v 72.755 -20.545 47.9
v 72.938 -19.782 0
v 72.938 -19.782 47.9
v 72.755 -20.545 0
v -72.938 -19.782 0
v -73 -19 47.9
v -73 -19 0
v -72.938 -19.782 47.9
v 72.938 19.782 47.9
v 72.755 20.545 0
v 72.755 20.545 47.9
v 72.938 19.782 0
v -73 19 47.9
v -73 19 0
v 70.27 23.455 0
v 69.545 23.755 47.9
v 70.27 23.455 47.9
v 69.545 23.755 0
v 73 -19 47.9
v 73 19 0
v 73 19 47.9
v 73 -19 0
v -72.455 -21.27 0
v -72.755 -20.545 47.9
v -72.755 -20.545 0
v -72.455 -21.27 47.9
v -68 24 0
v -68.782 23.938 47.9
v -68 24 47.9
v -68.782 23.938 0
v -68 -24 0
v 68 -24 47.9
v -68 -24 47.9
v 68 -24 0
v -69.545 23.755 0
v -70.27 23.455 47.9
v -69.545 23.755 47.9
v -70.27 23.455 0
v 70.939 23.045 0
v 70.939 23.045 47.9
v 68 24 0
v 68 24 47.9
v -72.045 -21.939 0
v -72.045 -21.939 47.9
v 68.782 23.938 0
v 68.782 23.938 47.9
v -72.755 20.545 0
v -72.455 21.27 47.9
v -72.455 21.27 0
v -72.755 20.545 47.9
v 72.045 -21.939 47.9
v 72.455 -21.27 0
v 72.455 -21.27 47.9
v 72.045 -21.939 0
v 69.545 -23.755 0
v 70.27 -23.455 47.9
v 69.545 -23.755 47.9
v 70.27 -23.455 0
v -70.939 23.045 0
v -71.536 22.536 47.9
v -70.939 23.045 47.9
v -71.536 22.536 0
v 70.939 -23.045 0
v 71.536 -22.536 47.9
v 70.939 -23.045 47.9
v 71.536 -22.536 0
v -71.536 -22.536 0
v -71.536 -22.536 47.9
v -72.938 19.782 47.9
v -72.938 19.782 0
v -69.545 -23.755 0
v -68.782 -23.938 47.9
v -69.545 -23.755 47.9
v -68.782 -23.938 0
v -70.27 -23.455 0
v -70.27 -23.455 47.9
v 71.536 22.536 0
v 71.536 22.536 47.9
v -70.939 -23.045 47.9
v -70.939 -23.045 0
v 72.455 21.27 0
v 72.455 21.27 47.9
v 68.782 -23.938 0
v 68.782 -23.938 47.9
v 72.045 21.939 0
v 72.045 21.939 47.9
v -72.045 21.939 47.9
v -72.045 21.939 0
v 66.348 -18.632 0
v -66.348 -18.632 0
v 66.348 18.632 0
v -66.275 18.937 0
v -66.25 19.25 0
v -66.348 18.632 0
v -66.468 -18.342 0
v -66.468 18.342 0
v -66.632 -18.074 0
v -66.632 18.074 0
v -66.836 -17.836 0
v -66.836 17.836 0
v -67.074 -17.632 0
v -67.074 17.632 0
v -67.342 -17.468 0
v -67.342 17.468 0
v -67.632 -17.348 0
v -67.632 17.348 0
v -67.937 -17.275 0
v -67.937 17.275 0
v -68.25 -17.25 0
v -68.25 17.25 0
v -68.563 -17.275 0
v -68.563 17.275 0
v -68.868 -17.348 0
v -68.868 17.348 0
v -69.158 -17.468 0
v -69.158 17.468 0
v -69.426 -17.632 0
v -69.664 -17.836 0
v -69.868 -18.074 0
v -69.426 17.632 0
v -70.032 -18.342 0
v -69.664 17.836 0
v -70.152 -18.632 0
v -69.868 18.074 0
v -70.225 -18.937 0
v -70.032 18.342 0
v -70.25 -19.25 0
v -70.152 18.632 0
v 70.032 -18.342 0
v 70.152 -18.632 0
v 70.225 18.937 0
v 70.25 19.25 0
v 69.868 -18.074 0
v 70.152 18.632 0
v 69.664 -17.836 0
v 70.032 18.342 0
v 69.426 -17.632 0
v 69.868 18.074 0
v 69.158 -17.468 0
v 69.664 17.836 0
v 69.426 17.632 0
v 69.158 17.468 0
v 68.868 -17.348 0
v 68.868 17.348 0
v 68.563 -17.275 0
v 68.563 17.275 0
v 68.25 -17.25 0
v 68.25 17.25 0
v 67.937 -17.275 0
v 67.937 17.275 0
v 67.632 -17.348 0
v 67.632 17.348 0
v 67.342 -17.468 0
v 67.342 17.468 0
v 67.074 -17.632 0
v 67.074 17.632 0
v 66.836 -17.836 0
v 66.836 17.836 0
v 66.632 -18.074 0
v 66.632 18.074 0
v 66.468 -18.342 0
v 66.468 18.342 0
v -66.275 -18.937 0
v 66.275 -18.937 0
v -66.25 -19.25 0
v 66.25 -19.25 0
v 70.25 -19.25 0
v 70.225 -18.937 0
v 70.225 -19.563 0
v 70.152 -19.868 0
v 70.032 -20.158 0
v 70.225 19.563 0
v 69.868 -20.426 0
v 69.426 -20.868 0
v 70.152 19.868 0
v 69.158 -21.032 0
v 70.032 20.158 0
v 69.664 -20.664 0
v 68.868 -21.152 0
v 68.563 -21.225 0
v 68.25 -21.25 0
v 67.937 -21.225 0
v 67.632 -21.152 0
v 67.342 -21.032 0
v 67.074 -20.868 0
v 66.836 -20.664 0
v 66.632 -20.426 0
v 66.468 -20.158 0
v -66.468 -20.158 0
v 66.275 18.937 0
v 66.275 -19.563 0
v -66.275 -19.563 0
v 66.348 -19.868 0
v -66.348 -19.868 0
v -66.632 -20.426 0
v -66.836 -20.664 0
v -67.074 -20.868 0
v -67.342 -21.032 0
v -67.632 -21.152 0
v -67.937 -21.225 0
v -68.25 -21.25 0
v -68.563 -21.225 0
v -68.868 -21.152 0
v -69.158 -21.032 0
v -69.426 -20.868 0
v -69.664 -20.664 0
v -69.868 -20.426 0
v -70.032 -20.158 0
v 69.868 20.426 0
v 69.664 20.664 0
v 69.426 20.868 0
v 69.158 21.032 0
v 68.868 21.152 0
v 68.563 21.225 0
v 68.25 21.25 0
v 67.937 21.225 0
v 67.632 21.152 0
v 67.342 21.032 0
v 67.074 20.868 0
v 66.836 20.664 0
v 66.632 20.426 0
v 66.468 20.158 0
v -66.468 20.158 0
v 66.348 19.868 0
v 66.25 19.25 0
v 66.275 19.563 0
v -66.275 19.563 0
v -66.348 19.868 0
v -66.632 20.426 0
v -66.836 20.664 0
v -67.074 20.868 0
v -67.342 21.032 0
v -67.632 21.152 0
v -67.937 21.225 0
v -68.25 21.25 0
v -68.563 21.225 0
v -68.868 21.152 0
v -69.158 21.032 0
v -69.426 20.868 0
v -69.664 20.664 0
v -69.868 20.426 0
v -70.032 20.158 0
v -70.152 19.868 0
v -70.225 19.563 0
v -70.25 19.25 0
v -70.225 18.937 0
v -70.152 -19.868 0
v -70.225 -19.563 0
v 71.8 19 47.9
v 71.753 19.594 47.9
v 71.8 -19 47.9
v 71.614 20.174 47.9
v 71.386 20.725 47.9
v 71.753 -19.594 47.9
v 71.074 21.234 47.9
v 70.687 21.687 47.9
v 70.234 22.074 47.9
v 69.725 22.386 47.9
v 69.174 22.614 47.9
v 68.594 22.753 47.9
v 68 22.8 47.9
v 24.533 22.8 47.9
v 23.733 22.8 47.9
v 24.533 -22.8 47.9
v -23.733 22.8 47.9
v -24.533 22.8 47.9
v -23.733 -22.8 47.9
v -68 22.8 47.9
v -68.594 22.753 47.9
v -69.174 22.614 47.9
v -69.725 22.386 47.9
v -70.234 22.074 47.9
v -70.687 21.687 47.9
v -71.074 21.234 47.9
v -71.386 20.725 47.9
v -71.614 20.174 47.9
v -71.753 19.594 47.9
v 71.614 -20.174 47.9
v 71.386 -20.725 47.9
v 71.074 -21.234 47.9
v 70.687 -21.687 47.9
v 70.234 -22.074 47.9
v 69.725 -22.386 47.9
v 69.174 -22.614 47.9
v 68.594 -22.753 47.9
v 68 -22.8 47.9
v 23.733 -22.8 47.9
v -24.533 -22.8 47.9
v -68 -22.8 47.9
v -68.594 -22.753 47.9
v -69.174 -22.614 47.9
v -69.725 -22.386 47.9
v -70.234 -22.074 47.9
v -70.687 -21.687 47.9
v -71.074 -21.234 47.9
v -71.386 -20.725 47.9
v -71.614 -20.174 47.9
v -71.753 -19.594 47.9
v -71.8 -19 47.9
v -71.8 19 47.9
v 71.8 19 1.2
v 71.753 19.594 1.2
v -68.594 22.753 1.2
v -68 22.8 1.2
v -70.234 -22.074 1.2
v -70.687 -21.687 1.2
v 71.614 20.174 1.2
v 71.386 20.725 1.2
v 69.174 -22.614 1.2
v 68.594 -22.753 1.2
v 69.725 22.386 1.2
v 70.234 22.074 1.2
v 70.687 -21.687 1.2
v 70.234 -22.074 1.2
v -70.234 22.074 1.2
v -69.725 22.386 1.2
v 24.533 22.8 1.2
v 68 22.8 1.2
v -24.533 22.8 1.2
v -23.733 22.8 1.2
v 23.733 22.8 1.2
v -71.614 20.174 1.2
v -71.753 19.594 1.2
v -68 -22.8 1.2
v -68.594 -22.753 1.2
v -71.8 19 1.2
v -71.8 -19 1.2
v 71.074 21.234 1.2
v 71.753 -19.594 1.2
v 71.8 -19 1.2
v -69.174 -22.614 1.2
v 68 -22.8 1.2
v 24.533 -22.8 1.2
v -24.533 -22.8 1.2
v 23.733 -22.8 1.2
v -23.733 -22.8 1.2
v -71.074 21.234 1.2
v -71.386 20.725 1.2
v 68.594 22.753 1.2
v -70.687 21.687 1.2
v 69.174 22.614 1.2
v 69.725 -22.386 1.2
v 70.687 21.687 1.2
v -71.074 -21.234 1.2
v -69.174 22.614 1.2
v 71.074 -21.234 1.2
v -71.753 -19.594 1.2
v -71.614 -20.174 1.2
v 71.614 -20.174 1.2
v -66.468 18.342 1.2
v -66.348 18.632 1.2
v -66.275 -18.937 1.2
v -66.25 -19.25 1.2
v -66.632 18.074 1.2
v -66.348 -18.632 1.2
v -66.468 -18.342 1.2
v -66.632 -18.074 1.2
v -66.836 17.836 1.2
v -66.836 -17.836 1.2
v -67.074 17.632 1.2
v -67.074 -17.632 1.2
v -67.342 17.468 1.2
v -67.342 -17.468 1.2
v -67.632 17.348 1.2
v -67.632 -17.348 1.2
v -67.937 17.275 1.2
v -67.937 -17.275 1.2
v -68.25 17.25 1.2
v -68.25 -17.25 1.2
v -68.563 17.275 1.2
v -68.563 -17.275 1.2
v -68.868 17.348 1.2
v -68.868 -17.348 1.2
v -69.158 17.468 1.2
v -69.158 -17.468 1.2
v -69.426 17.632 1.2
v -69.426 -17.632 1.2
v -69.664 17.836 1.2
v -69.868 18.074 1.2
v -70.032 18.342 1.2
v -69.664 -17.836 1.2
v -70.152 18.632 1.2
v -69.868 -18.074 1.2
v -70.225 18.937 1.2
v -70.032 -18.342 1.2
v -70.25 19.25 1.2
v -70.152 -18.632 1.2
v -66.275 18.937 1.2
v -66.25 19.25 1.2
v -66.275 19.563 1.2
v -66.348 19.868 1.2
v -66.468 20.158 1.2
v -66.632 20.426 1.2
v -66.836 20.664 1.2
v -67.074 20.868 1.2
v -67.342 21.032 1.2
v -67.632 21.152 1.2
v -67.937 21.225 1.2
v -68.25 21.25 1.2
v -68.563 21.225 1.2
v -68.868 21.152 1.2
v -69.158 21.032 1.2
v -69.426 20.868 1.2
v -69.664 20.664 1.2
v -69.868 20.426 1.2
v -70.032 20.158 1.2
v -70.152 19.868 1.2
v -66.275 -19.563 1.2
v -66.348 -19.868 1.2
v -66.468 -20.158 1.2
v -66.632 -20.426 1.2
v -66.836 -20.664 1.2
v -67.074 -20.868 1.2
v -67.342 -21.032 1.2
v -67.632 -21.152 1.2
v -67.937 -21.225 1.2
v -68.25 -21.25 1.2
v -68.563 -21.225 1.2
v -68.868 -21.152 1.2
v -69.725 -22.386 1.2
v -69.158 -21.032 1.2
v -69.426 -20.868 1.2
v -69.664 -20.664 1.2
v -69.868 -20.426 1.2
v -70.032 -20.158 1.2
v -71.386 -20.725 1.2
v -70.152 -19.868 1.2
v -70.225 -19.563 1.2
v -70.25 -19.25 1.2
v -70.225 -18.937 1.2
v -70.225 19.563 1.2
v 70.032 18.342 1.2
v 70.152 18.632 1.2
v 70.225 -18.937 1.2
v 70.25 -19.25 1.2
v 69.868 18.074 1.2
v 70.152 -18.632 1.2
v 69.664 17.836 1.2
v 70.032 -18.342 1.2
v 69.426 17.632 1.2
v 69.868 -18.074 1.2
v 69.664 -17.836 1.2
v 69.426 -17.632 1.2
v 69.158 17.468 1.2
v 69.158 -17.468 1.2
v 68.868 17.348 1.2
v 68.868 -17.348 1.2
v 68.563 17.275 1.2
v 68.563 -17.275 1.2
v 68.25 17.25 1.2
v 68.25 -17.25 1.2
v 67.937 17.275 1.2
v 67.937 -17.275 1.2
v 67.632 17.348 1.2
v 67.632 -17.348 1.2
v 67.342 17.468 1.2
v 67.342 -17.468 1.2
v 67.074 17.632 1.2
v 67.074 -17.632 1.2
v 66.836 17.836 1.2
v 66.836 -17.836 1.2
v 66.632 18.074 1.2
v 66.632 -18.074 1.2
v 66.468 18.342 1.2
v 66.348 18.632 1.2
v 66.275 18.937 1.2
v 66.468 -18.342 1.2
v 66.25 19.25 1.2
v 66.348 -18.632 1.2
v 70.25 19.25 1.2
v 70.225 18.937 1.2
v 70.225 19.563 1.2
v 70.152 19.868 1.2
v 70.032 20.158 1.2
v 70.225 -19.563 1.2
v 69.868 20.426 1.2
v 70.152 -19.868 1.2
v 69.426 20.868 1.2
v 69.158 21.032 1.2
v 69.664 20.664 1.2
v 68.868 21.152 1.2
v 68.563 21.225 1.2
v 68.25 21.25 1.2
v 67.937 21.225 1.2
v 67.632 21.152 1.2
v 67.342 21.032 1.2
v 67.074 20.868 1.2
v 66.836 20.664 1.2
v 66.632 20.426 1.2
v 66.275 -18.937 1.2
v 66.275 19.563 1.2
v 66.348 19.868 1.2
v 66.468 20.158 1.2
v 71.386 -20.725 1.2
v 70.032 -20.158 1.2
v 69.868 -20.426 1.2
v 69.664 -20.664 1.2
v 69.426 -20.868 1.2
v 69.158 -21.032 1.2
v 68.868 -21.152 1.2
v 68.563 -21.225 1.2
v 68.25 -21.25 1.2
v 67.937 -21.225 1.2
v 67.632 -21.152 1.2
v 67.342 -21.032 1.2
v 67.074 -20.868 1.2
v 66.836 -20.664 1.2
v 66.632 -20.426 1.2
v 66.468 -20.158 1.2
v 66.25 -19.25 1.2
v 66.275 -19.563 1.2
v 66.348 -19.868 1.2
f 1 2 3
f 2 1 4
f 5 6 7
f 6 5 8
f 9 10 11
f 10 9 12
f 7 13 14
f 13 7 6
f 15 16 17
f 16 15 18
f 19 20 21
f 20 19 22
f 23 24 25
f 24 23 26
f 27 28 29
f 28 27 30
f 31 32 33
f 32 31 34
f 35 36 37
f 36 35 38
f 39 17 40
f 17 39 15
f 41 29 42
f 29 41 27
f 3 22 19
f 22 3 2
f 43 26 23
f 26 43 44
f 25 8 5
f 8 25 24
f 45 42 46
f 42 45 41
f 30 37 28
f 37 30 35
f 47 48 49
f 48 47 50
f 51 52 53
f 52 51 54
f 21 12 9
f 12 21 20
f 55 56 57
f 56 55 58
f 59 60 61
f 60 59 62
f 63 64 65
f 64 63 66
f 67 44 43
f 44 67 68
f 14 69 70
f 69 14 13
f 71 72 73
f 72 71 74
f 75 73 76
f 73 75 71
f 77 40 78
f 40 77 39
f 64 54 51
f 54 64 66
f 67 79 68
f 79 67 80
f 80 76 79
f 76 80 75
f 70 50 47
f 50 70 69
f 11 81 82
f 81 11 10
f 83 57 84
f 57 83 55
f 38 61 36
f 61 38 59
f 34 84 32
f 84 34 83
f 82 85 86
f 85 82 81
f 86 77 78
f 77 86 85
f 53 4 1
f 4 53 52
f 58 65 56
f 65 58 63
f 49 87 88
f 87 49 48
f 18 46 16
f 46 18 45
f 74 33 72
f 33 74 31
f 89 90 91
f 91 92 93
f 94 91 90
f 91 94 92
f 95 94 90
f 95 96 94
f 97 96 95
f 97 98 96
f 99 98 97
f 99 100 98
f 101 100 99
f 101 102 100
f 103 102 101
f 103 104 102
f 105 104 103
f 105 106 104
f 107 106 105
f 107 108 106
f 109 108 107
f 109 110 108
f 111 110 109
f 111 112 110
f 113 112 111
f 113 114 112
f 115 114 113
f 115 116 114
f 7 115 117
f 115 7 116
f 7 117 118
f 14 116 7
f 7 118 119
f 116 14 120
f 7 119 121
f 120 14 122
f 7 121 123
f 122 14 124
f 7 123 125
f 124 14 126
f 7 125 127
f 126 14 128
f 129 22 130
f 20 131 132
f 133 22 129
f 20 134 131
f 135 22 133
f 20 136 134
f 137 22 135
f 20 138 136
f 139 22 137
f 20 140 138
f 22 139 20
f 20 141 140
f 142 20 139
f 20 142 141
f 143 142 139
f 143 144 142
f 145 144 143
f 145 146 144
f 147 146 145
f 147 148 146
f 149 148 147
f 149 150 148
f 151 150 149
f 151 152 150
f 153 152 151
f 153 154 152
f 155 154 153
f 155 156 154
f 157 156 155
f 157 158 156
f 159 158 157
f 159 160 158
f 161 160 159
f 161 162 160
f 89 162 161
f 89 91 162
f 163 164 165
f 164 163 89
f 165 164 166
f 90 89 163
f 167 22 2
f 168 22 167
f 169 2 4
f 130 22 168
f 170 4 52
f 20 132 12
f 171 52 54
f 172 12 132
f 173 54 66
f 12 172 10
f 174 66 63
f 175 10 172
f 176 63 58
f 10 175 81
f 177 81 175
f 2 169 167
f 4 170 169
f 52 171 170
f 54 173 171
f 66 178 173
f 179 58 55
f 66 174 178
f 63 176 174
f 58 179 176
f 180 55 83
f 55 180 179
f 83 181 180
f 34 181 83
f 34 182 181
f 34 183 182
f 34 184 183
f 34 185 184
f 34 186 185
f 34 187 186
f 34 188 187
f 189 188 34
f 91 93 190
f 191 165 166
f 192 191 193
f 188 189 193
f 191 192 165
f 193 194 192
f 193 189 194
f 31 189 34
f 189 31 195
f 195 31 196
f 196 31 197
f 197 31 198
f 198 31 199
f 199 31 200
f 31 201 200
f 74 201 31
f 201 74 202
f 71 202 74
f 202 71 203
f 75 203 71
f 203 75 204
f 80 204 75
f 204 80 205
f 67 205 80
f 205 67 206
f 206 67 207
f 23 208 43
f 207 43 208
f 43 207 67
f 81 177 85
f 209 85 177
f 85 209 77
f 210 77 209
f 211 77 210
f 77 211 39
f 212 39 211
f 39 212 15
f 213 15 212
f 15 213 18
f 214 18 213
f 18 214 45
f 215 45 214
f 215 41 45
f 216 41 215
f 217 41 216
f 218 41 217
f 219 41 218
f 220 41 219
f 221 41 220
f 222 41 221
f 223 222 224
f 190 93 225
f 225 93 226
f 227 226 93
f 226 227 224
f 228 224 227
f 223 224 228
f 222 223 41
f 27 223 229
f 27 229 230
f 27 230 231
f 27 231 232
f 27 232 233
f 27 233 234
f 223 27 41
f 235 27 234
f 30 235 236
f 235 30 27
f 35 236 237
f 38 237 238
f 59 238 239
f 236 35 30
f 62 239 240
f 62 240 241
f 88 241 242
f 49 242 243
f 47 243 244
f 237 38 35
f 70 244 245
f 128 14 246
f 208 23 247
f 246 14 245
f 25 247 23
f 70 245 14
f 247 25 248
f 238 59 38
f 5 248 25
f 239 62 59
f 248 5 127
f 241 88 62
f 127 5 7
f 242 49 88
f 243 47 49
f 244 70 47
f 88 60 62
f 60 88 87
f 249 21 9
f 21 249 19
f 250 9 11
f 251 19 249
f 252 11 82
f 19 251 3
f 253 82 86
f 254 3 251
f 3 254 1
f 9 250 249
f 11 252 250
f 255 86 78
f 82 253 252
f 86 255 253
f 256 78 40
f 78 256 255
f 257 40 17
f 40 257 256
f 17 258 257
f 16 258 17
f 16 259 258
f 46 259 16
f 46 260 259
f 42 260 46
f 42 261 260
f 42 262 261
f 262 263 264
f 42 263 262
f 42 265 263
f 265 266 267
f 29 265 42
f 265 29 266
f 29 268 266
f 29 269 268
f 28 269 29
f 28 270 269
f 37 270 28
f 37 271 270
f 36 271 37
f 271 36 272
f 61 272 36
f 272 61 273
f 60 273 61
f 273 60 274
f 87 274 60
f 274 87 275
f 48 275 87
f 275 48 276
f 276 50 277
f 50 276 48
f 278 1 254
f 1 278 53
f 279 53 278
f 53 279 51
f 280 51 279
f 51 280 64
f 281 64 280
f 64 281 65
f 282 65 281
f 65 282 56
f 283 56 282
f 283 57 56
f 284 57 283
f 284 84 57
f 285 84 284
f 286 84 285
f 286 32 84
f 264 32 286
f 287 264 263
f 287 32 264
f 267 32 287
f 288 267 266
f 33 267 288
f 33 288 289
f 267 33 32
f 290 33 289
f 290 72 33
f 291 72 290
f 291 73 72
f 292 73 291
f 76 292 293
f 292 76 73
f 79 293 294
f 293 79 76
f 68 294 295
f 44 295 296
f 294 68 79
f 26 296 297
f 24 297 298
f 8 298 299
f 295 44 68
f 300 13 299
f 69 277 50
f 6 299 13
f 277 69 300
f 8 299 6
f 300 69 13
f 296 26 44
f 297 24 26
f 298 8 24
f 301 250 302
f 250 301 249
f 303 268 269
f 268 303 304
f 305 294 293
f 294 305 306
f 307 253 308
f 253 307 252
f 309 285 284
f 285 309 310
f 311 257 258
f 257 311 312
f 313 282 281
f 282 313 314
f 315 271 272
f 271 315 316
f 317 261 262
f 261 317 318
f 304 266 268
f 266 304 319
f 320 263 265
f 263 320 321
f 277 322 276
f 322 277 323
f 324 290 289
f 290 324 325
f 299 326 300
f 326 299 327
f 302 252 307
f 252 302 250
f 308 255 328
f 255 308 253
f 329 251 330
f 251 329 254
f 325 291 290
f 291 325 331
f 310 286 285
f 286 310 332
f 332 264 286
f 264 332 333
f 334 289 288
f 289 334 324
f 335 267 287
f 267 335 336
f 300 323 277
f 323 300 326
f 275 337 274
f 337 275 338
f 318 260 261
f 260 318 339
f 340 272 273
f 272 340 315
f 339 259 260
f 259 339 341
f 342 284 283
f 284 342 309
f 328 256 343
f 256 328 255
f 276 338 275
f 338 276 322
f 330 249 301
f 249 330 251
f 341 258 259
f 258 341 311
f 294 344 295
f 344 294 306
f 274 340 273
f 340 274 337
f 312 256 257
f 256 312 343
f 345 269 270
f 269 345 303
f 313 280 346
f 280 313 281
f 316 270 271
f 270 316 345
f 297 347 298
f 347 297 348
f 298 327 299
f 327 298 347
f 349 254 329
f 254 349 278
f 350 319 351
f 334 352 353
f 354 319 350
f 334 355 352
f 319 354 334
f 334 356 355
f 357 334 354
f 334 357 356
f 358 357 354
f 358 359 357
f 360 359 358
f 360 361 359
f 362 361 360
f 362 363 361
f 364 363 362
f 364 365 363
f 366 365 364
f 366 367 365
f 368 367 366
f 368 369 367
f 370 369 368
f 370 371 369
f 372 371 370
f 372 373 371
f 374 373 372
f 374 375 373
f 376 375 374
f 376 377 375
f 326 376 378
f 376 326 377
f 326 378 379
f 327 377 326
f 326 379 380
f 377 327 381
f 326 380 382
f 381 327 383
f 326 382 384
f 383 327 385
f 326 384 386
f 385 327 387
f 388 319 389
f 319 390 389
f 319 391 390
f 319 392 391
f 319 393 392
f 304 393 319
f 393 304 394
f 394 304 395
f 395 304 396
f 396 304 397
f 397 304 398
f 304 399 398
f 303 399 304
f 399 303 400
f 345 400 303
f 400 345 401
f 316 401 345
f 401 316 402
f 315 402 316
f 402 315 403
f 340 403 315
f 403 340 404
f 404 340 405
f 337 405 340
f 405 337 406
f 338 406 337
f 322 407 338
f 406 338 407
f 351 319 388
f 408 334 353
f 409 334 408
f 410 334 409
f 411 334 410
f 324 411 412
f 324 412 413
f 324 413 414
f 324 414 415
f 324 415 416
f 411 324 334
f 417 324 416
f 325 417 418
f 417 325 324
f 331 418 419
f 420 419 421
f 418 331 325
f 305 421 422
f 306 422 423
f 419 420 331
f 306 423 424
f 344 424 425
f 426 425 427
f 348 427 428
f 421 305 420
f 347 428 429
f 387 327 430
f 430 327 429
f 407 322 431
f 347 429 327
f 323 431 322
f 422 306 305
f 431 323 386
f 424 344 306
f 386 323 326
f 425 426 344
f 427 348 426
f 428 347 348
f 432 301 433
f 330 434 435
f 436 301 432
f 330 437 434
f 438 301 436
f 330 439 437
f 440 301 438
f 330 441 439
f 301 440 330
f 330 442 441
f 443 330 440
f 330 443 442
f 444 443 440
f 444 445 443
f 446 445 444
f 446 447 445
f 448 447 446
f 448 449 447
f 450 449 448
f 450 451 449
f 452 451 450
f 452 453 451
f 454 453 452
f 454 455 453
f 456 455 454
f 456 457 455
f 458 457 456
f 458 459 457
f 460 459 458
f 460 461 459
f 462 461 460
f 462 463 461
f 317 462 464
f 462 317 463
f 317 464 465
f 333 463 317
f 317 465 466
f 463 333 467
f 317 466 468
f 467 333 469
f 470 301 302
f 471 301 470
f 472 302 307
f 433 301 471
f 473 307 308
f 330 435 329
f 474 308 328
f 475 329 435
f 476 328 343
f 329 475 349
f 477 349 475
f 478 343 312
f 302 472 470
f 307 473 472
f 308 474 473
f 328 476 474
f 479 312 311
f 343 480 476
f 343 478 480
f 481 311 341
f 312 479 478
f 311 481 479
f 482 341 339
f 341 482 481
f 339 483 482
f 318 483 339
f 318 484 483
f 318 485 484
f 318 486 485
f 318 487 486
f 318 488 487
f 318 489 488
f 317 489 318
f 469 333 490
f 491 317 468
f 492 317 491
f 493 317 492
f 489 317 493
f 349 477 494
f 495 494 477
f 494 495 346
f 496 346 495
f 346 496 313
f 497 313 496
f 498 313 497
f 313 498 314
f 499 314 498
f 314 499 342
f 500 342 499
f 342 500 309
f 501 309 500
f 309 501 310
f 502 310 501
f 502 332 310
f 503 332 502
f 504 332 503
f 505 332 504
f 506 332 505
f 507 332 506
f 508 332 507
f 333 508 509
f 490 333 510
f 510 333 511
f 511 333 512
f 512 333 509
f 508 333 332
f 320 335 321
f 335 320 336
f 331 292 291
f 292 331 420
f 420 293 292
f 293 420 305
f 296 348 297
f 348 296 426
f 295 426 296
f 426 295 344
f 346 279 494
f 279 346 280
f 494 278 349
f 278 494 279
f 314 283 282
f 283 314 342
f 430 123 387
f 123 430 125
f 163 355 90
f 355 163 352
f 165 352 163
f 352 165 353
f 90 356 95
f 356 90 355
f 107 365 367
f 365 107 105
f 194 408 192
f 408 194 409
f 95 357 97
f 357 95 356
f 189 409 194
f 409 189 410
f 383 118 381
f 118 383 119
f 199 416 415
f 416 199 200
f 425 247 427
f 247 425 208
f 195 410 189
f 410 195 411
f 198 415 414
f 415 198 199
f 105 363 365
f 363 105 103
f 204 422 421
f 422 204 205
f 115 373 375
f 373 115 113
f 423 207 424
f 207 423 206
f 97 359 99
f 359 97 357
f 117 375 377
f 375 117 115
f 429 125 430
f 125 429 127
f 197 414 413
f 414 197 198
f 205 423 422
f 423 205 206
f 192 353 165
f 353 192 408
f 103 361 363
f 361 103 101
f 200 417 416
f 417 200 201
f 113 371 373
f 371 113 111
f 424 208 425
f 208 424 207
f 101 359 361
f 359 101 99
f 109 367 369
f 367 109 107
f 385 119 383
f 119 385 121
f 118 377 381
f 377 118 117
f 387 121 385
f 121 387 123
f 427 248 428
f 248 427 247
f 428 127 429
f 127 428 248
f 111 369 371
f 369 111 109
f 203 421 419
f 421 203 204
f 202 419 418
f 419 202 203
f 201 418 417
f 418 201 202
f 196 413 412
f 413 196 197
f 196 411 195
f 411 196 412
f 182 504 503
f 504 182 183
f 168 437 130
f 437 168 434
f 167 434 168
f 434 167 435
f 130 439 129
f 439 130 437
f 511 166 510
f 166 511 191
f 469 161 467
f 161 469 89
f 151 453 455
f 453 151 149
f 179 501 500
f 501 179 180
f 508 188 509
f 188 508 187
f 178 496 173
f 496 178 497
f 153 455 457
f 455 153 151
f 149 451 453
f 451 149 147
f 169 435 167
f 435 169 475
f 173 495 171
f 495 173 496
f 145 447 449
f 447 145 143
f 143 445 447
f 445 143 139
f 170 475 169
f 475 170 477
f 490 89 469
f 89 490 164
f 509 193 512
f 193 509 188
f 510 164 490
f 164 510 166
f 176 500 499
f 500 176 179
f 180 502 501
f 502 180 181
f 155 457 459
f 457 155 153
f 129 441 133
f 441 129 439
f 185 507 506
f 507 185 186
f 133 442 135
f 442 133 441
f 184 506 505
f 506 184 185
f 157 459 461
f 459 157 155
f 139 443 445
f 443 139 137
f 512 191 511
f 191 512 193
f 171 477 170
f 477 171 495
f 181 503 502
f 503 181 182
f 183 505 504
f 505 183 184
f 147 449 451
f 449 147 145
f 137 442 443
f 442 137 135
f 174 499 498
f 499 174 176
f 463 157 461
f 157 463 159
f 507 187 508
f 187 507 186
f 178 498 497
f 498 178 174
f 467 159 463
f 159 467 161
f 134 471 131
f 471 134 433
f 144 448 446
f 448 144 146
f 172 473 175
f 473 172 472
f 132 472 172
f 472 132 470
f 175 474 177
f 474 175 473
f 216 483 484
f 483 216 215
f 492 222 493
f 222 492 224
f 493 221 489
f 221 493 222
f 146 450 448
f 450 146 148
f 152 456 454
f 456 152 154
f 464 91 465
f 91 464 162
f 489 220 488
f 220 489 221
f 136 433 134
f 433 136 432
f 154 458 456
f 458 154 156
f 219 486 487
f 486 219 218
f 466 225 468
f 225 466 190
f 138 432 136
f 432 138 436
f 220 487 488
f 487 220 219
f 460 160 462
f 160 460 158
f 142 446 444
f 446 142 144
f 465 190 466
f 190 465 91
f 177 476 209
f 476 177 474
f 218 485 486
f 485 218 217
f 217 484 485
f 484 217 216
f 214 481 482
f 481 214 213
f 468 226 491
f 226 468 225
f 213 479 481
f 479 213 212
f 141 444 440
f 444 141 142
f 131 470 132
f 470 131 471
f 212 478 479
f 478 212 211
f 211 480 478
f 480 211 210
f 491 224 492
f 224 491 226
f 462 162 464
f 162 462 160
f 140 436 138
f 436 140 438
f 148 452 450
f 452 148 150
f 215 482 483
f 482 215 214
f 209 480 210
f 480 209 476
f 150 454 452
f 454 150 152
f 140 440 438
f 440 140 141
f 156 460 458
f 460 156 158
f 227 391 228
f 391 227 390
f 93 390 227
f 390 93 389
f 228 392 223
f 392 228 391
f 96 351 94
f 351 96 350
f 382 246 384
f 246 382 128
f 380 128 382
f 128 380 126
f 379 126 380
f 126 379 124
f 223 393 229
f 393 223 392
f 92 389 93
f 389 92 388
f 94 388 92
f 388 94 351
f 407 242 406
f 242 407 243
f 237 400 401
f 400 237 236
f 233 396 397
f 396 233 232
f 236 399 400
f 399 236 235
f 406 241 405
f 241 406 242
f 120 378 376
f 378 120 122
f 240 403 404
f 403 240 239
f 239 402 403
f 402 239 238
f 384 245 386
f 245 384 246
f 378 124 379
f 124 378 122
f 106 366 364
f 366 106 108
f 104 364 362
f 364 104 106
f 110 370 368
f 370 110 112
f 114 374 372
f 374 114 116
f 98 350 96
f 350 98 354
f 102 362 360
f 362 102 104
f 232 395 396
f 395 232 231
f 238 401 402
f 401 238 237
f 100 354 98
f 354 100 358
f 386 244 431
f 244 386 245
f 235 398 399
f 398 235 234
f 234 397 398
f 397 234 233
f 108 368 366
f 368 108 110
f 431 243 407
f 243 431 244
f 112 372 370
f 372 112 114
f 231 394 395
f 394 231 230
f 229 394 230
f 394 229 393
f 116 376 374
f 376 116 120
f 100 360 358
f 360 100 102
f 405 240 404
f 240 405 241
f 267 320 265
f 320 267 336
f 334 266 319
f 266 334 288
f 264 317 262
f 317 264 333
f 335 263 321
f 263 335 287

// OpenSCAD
// created by skytale
// http://www.thingiverse.com/skytale/designs


// Options!
/* [SimplBox Insert] */
//Box measures
type = 6; // [0:Custom,1:Sortimo Small,2:Sortimo Medium,3:Sortimo Large, 4:Allit Euro Plus Small, 5:Allit Euro Plus Large, 6:Alutec]
// How many units in x-direction?
xCount = 3; // [1:6]
// How many units in y-direction?
yCount = 1; // [1:6]
// How many separators in x-direction?
xSeparators = 2;
// How many separators in y-direction?
ySeparators = 0;
// Feet holes?
feetHoles = true; // [true:yes, false:no]

/* [Misc Parameters] */
// Wall Thickness.
wallThickness = 1.2;
innerWallThickness = 0.8;

customWidth = 50;
customDepth = 50;
customHeight = 20;
feetHeight = 2.4;

/* [Hidden] */
cornerRadius = 5;
holeDistance = 6.5;
holeDiameter = 4;
fn = 40;

// DIMENSIONS

// Custom
if (type == 0) doBox(customWidth * xCount, customDepth * yCount, customHeight - feetHeight, holeDistance);

// Sortimo S
if (type == 1) doBox(52 * xCount, 52 * yCount, 31 - feetHeight, holeDistance);

// Sortimo M
if (type == 2) doBox(52 * xCount, 52 * yCount, 44 - feetHeight, holdeDistance);

// Sortimo L
if (type == 3) doBox(52 * xCount, 52 * yCount, 63 - feetHeight, holeDistance);

// Allit S
if (type == 4) doBox(54 * xCount, 54 * yCount, 45 - feetHeight, holeDistance);

// Allit L
if (type == 5) doBox(54 * xCount, 54 * yCount, 63 - feetHeight, holeDistance);

// Alutec (feet distance = 38.5)
if (type == 6) doBox(48 * xCount + (xCount - 1), 48 * yCount + (yCount - 1), 50.3 - feetHeight, (48-33.5-5)/2);  // 1mm*(xyCount -1):-> 1mm space compensation for multilength boxes


module doBox(width, depth, height, holeDistance) {
	difference() {
		box(width, depth, height);
		if (feetHoles) holes(width, depth, holeDistance);
	}
	makeSeparators(width, depth, height);
}

module box(width, depth, height) {
	cWidth = width - 2 * cornerRadius;
	cDepth = depth - 2* cornerRadius;
	difference() {
		hull() {
			translate([-cWidth / 2, -cDepth / 2, 0]) cylinder(height, cornerRadius, cornerRadius, $fn = fn);
			translate([+cWidth / 2, -cDepth / 2, 0]) cylinder(height, cornerRadius, cornerRadius, $fn = fn);
			translate([+cWidth / 2, +cDepth / 2, 0]) cylinder(height, cornerRadius, cornerRadius, $fn = fn);
			translate([-cWidth / 2, +cDepth / 2, 0]) cylinder(height, cornerRadius, cornerRadius, $fn = fn);
		}
		hull() {
			translate([-cWidth / 2, -cDepth / 2, wallThickness]) cylinder(height, cornerRadius - wallThickness, cornerRadius - wallThickness, $fn = fn);
			translate([+cWidth / 2, -cDepth / 2, wallThickness]) cylinder(height, cornerRadius - wallThickness, cornerRadius - wallThickness, $fn = fn);
			translate([+cWidth / 2, +cDepth / 2, wallThickness]) cylinder(height, cornerRadius - wallThickness, cornerRadius - wallThickness, $fn = fn);
			translate([-cWidth / 2, +cDepth / 2 , wallThickness]) cylinder(height, cornerRadius - wallThickness, cornerRadius - wallThickness, $fn = fn);
		}
	}
}

module holes(width, depth, holeDistance) {
	translate([-width / 2 + holeDistance, -depth / 2 + holeDistance, -1]) cylinder(wallThickness + 2, holeDiameter / 2, holeDiameter / 2, $fn = fn);
	translate([+width / 2 - holeDistance, -depth / 2 + holeDistance, -1]) cylinder(wallThickness + 2, holeDiameter / 2, holeDiameter / 2, $fn = fn);
	translate([+width / 2 - holeDistance, +depth / 2 - holeDistance, -1]) cylinder(wallThickness + 2, holeDiameter / 2, holeDiameter / 2, $fn = fn);
	translate([-width / 2 + holeDistance, +depth / 2 - holeDistance, -1]) cylinder(wallThickness + 2, holeDiameter / 2, holeDiameter / 2, $fn = fn);
}


// separators

module makeSeparators(width, depth, height){
 if(xSeparators >= 1){
  for (i = [1 : xSeparators]){
	xSeparator(width, depth, height, ((width - wallThickness) / (xSeparators + 1)) * i);
	//xSeparator(0);
	//xSeparator(width - wallThickness);
  }
 }
 if(ySeparators >= 1){
  for (i = [1 : ySeparators]){
  	ySeparator(width, depth, height, ((depth - wallThickness) / (ySeparators + 1)) * i);
	//ySeparator(0);
	//ySeparator(depth - wallThickness);
  }
 }
}

module xSeparator(width, depth, height, pos){
	translate([(-width + wallThickness) / 2 + pos, 0 ,height / 2]) cube(size = [innerWallThickness, depth - wallThickness, height], center = true);
}

module ySeparator(width, depth, height, pos){
	translate([0, (-depth + wallThickness) / 2 + pos ,height / 2]) cube(size = [width - wallThickness, innerWallThickness, height], center = true);
}
